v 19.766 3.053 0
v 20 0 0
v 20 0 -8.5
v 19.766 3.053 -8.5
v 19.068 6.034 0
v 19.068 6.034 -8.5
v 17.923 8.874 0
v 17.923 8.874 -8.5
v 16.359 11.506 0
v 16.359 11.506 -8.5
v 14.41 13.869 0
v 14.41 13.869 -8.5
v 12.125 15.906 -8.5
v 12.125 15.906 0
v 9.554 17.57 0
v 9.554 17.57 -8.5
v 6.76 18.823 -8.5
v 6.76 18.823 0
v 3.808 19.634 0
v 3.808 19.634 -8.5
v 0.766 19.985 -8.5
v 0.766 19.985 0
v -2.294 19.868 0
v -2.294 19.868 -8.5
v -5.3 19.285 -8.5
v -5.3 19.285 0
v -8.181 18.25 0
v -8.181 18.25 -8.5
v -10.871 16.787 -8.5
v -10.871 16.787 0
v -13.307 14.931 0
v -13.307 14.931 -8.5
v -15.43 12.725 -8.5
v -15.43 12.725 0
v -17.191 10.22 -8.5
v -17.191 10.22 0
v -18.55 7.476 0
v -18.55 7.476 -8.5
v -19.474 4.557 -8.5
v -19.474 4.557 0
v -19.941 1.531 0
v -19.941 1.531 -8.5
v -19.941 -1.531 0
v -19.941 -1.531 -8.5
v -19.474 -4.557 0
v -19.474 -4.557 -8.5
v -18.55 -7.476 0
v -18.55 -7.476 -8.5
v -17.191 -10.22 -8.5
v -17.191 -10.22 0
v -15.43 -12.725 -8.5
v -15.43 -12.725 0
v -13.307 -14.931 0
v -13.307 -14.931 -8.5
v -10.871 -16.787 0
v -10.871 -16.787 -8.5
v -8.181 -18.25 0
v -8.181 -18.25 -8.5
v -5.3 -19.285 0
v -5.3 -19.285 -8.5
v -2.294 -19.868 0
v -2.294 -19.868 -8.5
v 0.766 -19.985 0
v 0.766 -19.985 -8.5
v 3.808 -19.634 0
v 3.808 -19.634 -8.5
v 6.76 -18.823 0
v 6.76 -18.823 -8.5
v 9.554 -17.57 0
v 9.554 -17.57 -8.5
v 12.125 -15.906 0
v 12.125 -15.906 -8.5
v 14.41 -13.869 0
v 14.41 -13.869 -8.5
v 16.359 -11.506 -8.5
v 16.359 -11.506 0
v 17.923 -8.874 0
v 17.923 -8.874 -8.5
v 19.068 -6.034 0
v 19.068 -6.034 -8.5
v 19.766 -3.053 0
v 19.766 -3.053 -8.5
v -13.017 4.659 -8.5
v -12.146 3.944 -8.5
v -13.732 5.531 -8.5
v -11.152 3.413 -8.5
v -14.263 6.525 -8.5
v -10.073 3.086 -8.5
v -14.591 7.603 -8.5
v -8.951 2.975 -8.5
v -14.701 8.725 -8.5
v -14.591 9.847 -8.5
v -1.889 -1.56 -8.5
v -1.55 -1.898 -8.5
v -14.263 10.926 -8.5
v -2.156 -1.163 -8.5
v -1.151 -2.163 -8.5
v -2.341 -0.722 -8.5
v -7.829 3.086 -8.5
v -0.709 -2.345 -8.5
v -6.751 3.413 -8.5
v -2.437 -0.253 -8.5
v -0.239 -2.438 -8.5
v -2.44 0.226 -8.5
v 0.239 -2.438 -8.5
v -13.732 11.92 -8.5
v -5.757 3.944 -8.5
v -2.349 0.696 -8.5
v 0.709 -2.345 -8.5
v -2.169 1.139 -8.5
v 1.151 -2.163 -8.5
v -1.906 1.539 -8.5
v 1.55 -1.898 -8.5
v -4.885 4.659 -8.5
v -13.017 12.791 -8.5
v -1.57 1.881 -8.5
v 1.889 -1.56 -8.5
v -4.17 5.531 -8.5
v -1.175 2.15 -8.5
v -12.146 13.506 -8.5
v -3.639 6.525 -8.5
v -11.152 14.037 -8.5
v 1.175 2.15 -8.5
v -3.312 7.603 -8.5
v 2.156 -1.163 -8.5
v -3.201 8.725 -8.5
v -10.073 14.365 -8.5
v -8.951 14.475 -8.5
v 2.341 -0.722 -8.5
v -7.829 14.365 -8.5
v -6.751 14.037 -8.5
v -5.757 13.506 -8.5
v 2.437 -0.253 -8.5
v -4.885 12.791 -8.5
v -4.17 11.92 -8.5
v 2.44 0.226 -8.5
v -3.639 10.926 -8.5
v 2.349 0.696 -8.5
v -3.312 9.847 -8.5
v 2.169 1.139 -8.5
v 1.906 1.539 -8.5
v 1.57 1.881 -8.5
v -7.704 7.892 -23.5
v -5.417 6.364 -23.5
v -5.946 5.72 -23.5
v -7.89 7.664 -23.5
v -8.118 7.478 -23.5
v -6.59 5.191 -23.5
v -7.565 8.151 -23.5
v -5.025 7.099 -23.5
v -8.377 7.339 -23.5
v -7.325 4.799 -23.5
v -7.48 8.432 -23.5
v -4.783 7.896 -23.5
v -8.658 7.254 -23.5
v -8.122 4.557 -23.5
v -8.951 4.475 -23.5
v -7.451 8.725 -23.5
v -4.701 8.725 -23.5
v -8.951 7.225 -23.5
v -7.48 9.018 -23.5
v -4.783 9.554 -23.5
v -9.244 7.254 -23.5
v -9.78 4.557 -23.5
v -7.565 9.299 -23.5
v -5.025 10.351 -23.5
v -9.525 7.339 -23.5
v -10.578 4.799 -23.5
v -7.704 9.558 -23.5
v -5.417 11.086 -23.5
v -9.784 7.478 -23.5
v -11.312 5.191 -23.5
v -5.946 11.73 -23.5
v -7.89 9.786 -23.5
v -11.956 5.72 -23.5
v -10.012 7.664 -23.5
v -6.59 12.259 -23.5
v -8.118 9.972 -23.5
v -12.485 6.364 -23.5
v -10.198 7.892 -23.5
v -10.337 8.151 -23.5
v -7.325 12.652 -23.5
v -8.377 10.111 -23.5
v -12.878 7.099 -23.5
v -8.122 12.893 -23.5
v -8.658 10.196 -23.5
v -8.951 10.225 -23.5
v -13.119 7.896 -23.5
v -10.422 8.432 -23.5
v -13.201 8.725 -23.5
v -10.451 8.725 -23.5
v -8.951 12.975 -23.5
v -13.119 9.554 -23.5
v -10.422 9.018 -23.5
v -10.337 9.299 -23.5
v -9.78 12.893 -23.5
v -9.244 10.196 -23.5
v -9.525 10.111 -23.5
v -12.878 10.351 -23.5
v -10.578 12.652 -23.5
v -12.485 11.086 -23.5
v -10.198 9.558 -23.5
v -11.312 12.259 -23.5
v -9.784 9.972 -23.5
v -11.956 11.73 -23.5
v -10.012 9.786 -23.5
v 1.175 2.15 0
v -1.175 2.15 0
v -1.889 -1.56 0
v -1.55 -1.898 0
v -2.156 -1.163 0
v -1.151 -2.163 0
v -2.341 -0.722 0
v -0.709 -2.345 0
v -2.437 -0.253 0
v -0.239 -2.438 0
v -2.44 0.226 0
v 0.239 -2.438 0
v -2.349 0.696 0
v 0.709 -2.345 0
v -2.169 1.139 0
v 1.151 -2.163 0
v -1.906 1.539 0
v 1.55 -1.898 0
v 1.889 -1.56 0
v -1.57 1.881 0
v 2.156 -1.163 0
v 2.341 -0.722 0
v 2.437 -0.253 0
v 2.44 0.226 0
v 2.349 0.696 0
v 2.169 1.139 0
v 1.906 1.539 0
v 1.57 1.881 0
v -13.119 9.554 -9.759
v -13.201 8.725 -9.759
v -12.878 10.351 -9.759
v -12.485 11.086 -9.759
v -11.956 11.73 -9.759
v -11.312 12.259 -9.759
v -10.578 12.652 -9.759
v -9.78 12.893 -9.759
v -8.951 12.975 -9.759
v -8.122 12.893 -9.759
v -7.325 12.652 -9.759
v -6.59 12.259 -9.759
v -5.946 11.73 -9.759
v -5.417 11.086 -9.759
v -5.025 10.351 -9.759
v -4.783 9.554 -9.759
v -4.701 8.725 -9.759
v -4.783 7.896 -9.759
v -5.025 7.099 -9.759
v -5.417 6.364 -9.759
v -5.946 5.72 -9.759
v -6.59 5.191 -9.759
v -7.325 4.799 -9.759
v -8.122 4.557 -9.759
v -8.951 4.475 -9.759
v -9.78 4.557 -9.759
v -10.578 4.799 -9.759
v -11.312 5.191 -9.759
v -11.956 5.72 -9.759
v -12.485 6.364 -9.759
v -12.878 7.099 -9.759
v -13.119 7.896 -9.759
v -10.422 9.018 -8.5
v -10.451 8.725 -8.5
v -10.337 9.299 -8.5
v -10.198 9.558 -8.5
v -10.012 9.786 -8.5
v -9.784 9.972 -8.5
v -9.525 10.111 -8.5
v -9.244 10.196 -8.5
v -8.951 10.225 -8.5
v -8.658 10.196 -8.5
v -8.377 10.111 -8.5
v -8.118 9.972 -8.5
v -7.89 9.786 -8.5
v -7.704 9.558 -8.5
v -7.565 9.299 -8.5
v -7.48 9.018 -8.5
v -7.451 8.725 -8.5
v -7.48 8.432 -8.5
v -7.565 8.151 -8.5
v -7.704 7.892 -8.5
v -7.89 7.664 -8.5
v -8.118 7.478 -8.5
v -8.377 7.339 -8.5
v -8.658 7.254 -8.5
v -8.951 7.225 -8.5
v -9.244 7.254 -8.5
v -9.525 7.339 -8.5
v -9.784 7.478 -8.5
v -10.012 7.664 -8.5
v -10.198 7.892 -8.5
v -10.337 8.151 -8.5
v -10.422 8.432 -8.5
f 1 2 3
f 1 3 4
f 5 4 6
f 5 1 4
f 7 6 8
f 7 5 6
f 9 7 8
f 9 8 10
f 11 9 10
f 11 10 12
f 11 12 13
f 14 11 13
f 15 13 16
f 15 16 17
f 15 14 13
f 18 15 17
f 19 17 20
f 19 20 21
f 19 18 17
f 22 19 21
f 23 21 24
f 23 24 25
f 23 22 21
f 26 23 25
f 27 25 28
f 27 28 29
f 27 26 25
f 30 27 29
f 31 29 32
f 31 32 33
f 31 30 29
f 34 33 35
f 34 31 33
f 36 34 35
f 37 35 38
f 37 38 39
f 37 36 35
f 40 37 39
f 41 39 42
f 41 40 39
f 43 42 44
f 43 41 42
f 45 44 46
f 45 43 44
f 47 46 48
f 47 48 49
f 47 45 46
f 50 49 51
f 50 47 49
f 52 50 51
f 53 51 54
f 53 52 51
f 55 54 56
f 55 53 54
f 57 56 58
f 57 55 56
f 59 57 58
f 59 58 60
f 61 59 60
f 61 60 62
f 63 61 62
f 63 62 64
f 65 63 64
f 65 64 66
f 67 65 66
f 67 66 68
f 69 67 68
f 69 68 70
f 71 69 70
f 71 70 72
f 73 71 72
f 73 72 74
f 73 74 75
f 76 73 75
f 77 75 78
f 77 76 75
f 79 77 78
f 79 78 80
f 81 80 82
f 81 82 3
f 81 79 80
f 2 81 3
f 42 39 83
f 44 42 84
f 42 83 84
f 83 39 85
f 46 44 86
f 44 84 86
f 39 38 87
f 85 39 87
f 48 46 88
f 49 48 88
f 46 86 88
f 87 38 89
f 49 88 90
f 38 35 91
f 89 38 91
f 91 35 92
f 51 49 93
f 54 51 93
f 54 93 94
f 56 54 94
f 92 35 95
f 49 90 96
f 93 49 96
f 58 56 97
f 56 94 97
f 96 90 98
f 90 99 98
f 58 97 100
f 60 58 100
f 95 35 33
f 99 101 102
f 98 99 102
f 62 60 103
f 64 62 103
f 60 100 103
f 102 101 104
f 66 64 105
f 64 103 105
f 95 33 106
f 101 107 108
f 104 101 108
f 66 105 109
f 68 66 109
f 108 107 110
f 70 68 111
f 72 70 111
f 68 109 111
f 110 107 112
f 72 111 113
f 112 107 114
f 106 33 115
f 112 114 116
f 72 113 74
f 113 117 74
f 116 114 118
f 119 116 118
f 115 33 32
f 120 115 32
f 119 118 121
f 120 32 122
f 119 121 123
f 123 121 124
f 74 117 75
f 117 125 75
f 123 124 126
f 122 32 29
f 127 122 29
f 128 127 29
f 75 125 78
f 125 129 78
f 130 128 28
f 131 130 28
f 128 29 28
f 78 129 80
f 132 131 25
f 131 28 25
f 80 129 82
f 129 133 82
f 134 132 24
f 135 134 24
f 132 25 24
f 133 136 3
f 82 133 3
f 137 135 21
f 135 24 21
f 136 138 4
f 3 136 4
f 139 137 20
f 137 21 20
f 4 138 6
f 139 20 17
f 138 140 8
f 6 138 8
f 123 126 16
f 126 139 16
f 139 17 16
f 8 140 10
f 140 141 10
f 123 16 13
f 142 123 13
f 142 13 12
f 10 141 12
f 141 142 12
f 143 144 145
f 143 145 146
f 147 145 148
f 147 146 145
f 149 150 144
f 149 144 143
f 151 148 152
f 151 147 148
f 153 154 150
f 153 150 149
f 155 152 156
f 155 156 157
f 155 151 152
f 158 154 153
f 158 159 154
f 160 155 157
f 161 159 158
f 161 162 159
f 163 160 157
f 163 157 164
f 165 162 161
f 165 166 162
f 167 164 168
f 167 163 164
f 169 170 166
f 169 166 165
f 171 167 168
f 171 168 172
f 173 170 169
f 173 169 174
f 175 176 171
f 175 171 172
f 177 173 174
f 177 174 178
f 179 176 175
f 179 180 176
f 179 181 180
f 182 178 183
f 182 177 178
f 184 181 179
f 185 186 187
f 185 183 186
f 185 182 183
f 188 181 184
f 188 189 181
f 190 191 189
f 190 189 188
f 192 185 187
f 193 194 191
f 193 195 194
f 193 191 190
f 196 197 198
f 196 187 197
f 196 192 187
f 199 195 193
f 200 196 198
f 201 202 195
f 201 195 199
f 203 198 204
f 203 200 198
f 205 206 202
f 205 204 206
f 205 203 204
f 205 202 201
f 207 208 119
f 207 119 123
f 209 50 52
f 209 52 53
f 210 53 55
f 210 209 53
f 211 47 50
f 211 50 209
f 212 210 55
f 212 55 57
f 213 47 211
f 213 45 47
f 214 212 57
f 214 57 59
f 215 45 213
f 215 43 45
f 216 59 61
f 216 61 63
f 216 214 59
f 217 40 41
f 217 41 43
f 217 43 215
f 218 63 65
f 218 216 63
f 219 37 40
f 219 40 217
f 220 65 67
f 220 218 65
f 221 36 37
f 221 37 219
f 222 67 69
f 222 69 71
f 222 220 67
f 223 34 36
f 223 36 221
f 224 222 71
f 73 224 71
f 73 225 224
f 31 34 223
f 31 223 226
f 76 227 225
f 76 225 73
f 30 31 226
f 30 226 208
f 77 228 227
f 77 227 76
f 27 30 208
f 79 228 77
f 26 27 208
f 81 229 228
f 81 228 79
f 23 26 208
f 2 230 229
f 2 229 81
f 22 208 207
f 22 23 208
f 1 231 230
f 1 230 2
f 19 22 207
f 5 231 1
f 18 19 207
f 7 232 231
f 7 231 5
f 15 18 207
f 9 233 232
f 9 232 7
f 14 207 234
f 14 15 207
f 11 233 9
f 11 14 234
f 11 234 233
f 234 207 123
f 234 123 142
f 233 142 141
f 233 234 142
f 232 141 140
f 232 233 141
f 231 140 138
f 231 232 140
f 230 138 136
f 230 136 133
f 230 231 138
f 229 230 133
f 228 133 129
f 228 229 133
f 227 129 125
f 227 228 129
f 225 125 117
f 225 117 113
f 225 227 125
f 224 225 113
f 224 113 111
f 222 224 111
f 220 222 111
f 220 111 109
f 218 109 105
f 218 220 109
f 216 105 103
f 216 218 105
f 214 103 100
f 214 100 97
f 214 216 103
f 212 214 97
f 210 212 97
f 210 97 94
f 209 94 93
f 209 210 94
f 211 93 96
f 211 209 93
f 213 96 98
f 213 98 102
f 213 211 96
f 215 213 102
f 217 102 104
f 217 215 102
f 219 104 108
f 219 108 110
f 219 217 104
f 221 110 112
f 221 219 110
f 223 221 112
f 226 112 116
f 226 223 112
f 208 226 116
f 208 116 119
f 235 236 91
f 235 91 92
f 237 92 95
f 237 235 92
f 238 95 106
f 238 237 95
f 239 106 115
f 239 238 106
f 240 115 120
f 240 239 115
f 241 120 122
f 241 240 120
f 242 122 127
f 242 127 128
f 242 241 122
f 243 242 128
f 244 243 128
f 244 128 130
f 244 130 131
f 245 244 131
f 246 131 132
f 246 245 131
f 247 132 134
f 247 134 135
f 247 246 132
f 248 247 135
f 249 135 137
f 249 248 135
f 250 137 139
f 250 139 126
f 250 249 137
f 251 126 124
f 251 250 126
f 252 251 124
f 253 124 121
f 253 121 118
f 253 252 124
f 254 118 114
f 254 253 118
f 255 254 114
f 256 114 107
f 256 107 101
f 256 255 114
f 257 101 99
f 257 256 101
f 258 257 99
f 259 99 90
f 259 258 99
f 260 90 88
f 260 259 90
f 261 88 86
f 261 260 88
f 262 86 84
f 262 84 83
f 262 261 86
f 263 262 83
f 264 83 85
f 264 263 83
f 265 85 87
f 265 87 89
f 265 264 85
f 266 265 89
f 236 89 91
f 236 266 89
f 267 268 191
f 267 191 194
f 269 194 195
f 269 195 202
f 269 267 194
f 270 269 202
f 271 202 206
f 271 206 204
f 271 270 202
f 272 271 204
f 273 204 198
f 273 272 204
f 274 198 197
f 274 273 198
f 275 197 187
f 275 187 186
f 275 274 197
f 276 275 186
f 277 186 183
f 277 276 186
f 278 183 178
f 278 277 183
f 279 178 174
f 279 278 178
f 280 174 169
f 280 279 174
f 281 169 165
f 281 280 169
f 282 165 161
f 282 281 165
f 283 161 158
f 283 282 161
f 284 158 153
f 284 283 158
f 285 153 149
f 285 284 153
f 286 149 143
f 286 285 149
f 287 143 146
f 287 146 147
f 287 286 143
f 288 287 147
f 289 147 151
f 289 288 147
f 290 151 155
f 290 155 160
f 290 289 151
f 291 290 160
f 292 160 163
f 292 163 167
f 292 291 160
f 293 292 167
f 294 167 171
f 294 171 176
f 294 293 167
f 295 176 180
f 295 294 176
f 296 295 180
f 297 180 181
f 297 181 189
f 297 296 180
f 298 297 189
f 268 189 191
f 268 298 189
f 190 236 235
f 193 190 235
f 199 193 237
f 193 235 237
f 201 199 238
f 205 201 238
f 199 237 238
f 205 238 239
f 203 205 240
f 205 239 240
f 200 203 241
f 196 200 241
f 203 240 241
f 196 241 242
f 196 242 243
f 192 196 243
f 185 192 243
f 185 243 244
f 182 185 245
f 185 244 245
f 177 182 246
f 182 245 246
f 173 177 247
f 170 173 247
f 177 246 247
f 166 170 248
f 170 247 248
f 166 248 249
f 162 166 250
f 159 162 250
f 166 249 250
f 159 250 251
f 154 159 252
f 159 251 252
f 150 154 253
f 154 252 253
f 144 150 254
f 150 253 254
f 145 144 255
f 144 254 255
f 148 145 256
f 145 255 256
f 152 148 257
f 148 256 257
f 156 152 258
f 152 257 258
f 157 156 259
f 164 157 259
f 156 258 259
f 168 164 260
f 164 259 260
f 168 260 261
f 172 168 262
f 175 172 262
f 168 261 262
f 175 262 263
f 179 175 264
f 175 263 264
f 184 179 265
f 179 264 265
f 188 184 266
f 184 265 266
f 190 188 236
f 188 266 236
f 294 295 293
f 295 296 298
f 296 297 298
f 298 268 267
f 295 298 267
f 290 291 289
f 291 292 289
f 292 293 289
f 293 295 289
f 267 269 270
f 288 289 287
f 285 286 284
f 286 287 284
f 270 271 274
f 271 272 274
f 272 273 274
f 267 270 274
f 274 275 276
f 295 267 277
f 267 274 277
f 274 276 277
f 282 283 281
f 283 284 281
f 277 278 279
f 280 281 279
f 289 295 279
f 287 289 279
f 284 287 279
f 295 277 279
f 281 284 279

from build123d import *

# Parameters (mm, degrees)
CROQUIS1_R              = 20
SALIENTE_EXTRUIR1_DEPTH = 8.5
CROQUIS2_R              = 4.25
CROQUIS2_R_2            = 1.5
SALIENTE_EXTRUIR2_DEPTH = 15
CHAFL_N1_SIZE           = 1.5
CHAFL_N1_SIZE2          = 1.258649447


with BuildPart() as part:
    # Croquis1 → Saliente-Extruir1 (new body)
    with BuildSketch(Plane.XY):
        Circle(CROQUIS1_R)
        with BuildLine():
            Line((-1.174734012, 2.15), (1.174734012, 2.15))
            ThreePointArc((1.174734012, 2.15), (0, -2.45), (-1.174734012, 2.15))
        make_face(mode=Mode.SUBTRACT)
    extrude(amount=-SALIENTE_EXTRUIR1_DEPTH)

    # Croquis2 → Saliente-Extruir2 (add)
    with BuildSketch(Plane(origin=(0, 0, -8.5), x_dir=(-1, 0, 0), z_dir=(0, 0, -1))):
        with Locations((8.951131501, 8.725092827)):
            Circle(CROQUIS2_R)
        with Locations((8.951131501, 8.725092827)):
            Circle(CROQUIS2_R_2, mode=Mode.SUBTRACT)
    extrude(amount=SALIENTE_EXTRUIR2_DEPTH)

    # Chaflán1
    chafl_n1_edges = [part.edges().sort_by_distance(p)[0] for p in [
        (-4.701131501, 8.725092827, -8.5),
    ]]
    chafl_n1_side = [part.faces().sort_by_distance(p)[0] for p in [
        (-19.434314575, 0, -8.5),
    ]]
    chamfer(chafl_n1_edges, length=CHAFL_N1_SIZE, length2=CHAFL_N1_SIZE2, reference=chafl_n1_side[0])


solid = part.part
